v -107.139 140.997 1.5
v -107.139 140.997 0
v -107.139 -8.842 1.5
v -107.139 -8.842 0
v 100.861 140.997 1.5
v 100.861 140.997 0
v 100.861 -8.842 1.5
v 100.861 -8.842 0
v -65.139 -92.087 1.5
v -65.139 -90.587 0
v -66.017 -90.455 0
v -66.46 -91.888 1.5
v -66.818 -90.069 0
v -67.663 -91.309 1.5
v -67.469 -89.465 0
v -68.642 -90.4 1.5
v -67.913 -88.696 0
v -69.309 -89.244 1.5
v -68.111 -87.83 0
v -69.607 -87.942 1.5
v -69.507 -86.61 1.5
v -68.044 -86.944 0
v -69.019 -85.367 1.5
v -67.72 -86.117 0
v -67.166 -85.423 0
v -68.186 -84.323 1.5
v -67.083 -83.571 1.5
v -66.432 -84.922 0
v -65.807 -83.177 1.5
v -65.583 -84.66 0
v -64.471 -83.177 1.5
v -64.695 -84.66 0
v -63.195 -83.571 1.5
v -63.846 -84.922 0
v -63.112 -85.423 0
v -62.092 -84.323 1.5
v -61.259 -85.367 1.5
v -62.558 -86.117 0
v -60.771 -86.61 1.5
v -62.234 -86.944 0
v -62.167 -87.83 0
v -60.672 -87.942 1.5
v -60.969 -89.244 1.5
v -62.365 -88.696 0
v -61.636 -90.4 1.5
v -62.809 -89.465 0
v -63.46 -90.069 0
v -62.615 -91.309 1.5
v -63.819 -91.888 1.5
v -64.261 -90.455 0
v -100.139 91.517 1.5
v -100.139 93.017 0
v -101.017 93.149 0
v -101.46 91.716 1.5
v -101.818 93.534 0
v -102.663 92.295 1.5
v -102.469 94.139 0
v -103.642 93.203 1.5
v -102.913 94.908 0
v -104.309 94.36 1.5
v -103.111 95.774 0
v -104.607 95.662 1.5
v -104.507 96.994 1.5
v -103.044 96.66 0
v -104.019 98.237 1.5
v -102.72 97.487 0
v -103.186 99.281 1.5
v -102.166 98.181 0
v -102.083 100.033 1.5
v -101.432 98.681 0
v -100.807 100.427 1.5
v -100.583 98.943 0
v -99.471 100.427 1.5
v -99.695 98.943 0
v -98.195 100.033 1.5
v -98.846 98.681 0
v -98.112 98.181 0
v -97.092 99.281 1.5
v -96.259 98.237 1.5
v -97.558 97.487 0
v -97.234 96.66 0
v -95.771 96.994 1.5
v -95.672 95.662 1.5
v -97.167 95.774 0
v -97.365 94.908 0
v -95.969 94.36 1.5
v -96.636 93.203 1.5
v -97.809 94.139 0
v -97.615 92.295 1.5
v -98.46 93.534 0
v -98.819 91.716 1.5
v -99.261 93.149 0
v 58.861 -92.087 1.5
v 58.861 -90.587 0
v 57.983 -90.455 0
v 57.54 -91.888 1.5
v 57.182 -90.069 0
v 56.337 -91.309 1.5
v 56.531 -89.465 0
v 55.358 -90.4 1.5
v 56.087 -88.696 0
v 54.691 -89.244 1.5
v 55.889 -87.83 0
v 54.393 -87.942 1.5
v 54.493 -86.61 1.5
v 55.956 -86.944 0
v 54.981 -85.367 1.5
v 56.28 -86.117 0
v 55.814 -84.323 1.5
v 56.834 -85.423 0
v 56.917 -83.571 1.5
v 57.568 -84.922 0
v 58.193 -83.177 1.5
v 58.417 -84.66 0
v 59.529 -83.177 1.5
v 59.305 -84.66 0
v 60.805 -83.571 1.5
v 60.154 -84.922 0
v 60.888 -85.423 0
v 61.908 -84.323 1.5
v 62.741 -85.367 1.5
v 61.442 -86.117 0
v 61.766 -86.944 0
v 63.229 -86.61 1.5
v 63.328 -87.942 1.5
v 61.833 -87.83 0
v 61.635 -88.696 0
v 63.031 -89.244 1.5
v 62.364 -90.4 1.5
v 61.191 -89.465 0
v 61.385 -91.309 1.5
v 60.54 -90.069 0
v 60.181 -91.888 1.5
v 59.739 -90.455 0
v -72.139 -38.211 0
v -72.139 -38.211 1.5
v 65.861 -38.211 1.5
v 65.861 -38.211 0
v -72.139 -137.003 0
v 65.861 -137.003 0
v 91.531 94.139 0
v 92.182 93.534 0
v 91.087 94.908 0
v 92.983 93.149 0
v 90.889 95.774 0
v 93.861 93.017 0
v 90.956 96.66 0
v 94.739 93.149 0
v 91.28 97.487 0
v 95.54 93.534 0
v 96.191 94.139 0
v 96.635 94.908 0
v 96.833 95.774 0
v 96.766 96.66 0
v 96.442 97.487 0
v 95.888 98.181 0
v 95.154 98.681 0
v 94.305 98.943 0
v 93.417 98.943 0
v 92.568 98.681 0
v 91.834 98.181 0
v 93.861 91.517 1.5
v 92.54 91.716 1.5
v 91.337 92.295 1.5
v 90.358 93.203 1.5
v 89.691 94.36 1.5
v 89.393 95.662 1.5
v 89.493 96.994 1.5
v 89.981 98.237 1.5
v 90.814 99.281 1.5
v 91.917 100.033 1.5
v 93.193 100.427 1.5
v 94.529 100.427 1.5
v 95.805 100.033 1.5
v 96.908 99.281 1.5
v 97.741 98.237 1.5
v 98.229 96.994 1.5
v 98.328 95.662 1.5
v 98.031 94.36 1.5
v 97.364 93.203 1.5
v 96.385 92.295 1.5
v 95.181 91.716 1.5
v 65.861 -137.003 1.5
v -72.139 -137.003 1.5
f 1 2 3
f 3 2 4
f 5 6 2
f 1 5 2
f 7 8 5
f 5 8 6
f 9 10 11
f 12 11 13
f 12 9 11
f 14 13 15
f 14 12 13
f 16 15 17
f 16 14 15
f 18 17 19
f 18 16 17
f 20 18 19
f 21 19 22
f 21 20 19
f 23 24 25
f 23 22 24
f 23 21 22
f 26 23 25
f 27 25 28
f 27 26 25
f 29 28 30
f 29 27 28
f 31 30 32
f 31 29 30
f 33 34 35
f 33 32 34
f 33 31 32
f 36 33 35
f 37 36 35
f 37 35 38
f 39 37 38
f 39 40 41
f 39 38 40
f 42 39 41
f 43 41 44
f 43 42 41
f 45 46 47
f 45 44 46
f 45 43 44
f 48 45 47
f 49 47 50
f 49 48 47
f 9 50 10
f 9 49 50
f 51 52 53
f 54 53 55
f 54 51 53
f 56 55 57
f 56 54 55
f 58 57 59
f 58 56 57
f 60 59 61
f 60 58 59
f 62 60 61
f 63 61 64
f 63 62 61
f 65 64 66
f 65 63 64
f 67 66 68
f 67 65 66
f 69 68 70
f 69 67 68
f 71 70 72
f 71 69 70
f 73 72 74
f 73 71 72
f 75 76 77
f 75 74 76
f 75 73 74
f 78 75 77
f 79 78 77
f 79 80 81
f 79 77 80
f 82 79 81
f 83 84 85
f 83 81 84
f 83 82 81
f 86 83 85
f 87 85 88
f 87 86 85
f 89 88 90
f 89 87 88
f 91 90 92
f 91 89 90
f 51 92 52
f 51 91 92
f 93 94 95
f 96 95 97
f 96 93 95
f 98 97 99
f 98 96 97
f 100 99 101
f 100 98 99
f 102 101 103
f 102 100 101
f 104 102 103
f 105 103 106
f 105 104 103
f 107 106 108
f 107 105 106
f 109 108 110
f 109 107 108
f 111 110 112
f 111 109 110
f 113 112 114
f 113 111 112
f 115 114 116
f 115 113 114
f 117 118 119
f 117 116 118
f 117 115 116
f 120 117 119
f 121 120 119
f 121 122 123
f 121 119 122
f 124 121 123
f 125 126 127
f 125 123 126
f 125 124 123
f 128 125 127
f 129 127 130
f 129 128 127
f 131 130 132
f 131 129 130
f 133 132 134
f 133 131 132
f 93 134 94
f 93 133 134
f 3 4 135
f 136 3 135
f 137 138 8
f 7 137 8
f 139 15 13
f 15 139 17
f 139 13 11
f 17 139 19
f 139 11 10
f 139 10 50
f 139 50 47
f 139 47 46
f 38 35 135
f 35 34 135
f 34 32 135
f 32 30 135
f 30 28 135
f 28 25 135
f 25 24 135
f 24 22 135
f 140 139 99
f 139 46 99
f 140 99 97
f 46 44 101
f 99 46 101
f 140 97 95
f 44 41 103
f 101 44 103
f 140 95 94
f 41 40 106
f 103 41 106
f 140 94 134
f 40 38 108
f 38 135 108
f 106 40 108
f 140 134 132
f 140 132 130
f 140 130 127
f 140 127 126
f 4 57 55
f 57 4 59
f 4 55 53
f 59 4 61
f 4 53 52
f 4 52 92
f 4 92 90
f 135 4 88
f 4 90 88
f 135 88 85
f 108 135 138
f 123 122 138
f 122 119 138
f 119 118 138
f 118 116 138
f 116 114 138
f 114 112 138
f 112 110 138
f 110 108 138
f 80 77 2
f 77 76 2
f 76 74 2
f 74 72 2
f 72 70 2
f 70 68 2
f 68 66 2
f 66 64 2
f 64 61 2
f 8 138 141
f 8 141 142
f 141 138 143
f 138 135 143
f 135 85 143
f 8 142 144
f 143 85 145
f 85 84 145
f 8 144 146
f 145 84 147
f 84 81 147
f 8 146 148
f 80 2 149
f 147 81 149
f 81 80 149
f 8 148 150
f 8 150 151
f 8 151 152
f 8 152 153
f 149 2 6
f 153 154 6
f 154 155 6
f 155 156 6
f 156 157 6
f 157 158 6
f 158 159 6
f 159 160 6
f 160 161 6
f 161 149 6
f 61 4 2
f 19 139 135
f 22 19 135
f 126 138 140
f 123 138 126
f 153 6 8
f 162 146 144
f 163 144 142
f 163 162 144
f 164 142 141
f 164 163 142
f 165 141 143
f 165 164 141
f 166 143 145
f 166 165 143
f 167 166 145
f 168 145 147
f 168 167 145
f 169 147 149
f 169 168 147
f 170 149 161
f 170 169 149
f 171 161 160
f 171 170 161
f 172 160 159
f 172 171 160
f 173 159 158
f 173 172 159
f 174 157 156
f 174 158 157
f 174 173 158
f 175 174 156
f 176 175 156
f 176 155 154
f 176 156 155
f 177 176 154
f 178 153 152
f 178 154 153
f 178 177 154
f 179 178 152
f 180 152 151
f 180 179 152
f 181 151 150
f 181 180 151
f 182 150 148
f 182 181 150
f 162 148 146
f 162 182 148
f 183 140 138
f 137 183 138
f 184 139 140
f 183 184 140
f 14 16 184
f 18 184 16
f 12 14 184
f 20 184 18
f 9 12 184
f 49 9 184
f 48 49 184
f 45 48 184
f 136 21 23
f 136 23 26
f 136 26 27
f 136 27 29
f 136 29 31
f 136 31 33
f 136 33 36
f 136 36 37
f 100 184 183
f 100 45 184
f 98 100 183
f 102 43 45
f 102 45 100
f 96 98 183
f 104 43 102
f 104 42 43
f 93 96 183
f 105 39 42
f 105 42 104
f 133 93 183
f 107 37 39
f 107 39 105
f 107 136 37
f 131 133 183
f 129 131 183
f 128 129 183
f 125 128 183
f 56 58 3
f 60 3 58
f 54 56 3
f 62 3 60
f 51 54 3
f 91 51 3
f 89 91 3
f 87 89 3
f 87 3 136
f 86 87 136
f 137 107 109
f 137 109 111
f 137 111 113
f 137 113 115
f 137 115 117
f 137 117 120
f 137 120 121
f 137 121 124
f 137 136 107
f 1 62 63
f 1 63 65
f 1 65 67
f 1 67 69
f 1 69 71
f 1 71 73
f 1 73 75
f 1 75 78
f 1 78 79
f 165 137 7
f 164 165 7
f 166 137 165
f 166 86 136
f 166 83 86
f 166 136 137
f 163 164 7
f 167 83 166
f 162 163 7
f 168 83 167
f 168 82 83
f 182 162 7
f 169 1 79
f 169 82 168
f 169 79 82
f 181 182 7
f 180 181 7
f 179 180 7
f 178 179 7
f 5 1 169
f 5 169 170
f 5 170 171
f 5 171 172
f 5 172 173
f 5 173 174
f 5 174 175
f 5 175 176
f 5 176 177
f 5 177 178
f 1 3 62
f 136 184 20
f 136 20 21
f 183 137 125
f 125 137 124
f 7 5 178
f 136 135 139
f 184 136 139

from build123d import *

# Parameters (mm, degrees)
RESSALTO_EXTRUS_O1_DEPTH                     = 1.5
ESCAREADO_PARA_PARAFUSO_ALLEN_SEXTAV_2_COUNT = 2
ESCAREADO_PARA_PARAFUSO_ALLEN_SEXTAV_2_PITCH = 194
ESCAREADO_PARA_PARAFUSO_ALLEN_SEXTAV_3_COUNT = 2
ESCAREADO_PARA_PARAFUSO_ALLEN_SEXTAV_3_PITCH = 242.881337709
ESCAREADO_PARA_PARAFUSO_ALLEN_SEXTAV_4_COUNT = 2
ESCAREADO_PARA_PARAFUSO_ALLEN_SEXTAV_4_PITCH = 186.909989587


with BuildPart() as part:
    # Esboço1 → Ressalto-extrusão1 (new body)
    with BuildSketch(Plane.XY):
        Polygon((100.860947645, 140.996609125), (-107.139052355, 140.996609125), (-107.139052355, -8.842442963), (-72.139052355, -38.210930054), (-72.139052355, -137.003390875), (65.860947645, -137.003390875), (65.860947645, -38.210930054), (100.860947645, -8.842442963), align=None)
    extrude(amount=RESSALTO_EXTRUS_O1_DEPTH)

    # Esboço3 → Escareado para parafuso Allen sextavado escareado de M41 (revolve, cut)
    with BuildSketch(Plane(origin=(-100.139052355, 95.996609125, 1.5), x_dir=(0, -1, 0), z_dir=(1, 0, 0))):
        Polygon((0, 0), (0, 1.5), (2.25, 1.5), (2.25, 2.23), (4.48, 0), align=None)
    escareado_para_parafuso_allen_sextavado = revolve(axis=Axis((-100.139052355, 95.996609125, 7.85), (0, 0, -1)), mode=Mode.SUBTRACT)

    # Escareado para parafuso Allen sextav 2: Escareado para parafuso Allen sextavado escareado de M41 ×2
    with Locations(*[(i * ESCAREADO_PARA_PARAFUSO_ALLEN_SEXTAV_2_PITCH, 0, 0) for i in range(1, ESCAREADO_PARA_PARAFUSO_ALLEN_SEXTAV_2_COUNT)]):
        add(escareado_para_parafuso_allen_sextavado, mode=Mode.SUBTRACT)

    # Escareado para parafuso Allen sextav 3: Escareado para parafuso Allen sextavado escareado de M41 ×2
    with Locations(*[Vector(0.654640663, -0.755940211, 0) * (i * ESCAREADO_PARA_PARAFUSO_ALLEN_SEXTAV_3_PITCH) for i in range(1, ESCAREADO_PARA_PARAFUSO_ALLEN_SEXTAV_3_COUNT)]):
        add(escareado_para_parafuso_allen_sextavado, mode=Mode.SUBTRACT)

    # Escareado para parafuso Allen sextav 4: Escareado para parafuso Allen sextavado escareado de M41 ×2
    with Locations(*[Vector(0.187255909, -0.982311165, 0) * (i * ESCAREADO_PARA_PARAFUSO_ALLEN_SEXTAV_4_PITCH) for i in range(1, ESCAREADO_PARA_PARAFUSO_ALLEN_SEXTAV_4_COUNT)]):
        add(escareado_para_parafuso_allen_sextavado, mode=Mode.SUBTRACT)


solid = part.part
